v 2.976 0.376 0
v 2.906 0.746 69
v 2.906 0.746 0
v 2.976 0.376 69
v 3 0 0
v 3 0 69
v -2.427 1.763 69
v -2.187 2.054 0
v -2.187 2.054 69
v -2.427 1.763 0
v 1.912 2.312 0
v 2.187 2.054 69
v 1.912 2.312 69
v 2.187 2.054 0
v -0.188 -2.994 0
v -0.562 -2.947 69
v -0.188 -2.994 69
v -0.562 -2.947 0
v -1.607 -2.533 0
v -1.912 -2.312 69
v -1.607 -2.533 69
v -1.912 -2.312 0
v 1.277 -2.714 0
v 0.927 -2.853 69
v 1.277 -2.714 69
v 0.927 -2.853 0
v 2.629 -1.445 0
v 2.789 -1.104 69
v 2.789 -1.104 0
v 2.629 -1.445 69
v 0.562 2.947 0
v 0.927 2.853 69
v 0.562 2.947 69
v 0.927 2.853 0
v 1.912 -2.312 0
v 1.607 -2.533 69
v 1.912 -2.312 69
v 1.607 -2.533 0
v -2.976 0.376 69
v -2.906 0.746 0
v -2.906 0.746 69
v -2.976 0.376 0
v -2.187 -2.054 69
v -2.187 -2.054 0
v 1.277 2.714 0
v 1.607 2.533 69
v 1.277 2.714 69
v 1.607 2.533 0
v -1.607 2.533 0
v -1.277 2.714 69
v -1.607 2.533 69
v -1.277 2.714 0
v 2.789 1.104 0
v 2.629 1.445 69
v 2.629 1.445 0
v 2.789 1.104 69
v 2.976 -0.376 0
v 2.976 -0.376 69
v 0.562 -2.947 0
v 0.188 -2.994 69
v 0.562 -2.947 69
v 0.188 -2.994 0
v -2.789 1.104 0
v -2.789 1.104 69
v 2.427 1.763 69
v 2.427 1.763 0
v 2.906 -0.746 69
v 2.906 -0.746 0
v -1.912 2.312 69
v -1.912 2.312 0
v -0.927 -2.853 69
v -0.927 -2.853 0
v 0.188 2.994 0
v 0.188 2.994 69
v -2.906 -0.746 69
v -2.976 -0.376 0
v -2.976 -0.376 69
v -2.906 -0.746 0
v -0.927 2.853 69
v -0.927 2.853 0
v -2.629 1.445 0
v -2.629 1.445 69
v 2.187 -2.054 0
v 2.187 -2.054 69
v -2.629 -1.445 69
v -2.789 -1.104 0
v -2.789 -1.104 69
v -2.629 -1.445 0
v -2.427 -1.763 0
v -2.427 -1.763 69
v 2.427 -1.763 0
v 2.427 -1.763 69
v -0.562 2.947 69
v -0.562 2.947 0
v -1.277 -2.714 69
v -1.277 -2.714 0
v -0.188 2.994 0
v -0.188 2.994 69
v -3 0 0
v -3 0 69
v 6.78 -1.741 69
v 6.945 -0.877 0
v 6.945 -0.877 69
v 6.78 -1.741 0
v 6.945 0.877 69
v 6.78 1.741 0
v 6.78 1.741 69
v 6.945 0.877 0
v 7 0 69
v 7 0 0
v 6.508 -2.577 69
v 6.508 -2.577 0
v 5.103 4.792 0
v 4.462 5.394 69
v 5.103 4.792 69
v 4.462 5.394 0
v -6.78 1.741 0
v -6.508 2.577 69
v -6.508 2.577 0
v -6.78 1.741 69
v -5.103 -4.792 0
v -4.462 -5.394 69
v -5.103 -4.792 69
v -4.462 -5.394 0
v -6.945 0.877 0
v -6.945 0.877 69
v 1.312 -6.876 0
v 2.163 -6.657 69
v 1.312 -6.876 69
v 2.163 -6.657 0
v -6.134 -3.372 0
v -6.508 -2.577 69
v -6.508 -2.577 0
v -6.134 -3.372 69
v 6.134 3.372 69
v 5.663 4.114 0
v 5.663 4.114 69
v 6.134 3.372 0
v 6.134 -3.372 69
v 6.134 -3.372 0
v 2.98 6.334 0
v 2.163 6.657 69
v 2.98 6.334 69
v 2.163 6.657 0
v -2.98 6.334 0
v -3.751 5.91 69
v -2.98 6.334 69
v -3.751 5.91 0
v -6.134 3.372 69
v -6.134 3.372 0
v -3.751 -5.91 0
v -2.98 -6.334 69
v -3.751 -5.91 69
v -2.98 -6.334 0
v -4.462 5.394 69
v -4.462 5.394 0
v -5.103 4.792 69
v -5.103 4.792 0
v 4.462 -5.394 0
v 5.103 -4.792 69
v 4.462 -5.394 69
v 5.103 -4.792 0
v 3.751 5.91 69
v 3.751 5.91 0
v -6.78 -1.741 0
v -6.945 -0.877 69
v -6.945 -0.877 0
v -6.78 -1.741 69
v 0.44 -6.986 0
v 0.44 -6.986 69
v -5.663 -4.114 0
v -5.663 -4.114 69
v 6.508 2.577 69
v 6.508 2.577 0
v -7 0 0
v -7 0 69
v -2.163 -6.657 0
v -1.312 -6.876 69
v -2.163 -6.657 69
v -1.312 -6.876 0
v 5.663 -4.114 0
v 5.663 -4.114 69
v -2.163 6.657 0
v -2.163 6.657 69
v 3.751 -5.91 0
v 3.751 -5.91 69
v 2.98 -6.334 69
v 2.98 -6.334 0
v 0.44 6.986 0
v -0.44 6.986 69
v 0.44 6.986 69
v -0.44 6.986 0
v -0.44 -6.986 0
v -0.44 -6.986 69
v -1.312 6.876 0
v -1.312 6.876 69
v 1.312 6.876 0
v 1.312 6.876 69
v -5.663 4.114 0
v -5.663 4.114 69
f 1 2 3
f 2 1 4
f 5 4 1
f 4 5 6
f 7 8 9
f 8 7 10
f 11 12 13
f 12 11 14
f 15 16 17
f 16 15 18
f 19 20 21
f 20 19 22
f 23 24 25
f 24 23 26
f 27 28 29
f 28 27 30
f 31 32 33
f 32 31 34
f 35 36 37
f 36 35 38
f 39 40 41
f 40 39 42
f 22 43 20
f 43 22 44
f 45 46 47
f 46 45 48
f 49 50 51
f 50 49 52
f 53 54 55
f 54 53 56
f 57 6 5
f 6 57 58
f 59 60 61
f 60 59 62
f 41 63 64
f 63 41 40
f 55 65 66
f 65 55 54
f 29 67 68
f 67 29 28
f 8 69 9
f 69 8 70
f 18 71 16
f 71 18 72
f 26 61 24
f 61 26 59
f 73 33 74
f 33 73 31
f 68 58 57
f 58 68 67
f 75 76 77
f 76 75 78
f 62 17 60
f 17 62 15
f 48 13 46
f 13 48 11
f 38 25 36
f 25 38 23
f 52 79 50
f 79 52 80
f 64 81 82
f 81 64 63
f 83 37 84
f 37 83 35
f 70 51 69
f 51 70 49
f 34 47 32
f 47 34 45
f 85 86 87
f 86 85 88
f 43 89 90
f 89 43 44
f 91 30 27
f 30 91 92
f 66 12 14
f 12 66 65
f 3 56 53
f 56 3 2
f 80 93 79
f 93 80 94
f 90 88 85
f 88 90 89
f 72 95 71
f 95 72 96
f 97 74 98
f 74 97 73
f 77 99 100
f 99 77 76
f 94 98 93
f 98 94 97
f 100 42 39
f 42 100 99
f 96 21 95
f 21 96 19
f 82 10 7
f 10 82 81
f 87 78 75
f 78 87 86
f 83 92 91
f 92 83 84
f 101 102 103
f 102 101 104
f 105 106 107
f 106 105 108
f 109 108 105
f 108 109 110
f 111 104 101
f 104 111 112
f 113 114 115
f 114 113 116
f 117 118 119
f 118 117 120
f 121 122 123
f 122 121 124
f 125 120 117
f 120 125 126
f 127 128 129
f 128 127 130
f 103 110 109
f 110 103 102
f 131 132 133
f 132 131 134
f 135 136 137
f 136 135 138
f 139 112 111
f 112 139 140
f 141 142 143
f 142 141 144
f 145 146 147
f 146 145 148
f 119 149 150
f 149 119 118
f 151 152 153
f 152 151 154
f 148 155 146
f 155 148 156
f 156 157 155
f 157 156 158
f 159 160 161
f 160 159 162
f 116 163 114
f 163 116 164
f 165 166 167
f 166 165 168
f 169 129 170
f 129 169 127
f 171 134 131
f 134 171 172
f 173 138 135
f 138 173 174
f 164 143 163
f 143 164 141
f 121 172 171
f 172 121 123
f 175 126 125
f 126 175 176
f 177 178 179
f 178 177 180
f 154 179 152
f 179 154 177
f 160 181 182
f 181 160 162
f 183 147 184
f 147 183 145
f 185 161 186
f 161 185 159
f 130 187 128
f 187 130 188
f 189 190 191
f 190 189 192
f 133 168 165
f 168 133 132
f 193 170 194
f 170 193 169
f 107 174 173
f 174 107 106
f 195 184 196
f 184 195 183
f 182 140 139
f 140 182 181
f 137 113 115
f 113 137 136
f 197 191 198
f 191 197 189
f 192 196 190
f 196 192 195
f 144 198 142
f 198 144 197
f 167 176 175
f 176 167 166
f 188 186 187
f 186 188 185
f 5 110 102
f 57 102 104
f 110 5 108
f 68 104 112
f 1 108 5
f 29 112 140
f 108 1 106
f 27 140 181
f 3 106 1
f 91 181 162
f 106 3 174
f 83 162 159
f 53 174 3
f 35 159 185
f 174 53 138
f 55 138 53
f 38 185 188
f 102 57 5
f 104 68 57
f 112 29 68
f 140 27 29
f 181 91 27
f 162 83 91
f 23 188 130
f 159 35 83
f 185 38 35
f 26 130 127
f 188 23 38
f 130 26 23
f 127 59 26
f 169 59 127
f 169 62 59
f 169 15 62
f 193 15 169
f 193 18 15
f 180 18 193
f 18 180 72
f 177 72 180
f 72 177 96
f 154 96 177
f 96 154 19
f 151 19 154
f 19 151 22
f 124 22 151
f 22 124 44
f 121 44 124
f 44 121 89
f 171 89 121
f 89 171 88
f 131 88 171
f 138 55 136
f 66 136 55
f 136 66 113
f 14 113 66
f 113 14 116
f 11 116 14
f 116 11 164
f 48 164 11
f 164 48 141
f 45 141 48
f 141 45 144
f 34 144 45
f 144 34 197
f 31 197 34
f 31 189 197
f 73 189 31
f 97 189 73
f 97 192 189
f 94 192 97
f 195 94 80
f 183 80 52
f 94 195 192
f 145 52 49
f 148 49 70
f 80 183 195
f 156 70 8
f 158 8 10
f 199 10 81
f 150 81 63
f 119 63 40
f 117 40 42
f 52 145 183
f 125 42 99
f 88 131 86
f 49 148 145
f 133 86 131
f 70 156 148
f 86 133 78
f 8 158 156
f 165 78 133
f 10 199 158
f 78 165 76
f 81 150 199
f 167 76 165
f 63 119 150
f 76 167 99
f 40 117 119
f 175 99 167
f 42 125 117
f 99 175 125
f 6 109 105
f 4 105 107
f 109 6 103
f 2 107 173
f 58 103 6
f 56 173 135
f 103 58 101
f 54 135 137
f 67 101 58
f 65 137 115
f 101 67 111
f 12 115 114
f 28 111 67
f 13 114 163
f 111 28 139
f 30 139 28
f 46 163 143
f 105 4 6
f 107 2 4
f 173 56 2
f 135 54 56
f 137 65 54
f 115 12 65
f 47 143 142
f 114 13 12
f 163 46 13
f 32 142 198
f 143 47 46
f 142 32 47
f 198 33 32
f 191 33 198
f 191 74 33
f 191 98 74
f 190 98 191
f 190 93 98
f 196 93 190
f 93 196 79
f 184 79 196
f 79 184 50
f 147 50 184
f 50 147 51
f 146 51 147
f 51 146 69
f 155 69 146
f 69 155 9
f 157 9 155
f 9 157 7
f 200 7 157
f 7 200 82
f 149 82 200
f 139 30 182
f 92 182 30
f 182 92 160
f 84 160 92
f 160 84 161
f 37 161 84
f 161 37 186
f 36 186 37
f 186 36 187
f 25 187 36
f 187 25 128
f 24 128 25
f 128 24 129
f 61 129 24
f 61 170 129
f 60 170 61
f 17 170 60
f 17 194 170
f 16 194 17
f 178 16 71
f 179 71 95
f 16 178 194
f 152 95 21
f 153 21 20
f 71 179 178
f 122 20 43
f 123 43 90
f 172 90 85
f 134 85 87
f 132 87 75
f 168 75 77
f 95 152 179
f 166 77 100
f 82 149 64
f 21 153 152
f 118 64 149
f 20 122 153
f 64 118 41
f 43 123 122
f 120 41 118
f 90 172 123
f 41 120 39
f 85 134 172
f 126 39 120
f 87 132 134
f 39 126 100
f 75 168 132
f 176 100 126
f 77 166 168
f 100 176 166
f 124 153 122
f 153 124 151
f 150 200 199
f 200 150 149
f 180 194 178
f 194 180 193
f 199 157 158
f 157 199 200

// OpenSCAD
$fn = 50;


difference() {
	union() {
		cylinder(h = 69, r = 7.0000000000);
	}
	union() {
		translate(v = [0.0000000000, 0.0000000000, -100.0000000000]) {
			cylinder(h = 200, r = 3.0000000000);
		}
		translate(v = [0.0000000000, 0.0000000000, -100.0000000000]) {
			cylinder(h = 200, r = 3.0000000000);
		}
		translate(v = [0.0000000000, 0.0000000000, -100.0000000000]) {
			cylinder(h = 200, r = 3.0000000000);
		}
		translate(v = [0.0000000000, 0.0000000000, -100.0000000000]) {
			cylinder(h = 200, r = 3.0000000000);
		}
	}
}
